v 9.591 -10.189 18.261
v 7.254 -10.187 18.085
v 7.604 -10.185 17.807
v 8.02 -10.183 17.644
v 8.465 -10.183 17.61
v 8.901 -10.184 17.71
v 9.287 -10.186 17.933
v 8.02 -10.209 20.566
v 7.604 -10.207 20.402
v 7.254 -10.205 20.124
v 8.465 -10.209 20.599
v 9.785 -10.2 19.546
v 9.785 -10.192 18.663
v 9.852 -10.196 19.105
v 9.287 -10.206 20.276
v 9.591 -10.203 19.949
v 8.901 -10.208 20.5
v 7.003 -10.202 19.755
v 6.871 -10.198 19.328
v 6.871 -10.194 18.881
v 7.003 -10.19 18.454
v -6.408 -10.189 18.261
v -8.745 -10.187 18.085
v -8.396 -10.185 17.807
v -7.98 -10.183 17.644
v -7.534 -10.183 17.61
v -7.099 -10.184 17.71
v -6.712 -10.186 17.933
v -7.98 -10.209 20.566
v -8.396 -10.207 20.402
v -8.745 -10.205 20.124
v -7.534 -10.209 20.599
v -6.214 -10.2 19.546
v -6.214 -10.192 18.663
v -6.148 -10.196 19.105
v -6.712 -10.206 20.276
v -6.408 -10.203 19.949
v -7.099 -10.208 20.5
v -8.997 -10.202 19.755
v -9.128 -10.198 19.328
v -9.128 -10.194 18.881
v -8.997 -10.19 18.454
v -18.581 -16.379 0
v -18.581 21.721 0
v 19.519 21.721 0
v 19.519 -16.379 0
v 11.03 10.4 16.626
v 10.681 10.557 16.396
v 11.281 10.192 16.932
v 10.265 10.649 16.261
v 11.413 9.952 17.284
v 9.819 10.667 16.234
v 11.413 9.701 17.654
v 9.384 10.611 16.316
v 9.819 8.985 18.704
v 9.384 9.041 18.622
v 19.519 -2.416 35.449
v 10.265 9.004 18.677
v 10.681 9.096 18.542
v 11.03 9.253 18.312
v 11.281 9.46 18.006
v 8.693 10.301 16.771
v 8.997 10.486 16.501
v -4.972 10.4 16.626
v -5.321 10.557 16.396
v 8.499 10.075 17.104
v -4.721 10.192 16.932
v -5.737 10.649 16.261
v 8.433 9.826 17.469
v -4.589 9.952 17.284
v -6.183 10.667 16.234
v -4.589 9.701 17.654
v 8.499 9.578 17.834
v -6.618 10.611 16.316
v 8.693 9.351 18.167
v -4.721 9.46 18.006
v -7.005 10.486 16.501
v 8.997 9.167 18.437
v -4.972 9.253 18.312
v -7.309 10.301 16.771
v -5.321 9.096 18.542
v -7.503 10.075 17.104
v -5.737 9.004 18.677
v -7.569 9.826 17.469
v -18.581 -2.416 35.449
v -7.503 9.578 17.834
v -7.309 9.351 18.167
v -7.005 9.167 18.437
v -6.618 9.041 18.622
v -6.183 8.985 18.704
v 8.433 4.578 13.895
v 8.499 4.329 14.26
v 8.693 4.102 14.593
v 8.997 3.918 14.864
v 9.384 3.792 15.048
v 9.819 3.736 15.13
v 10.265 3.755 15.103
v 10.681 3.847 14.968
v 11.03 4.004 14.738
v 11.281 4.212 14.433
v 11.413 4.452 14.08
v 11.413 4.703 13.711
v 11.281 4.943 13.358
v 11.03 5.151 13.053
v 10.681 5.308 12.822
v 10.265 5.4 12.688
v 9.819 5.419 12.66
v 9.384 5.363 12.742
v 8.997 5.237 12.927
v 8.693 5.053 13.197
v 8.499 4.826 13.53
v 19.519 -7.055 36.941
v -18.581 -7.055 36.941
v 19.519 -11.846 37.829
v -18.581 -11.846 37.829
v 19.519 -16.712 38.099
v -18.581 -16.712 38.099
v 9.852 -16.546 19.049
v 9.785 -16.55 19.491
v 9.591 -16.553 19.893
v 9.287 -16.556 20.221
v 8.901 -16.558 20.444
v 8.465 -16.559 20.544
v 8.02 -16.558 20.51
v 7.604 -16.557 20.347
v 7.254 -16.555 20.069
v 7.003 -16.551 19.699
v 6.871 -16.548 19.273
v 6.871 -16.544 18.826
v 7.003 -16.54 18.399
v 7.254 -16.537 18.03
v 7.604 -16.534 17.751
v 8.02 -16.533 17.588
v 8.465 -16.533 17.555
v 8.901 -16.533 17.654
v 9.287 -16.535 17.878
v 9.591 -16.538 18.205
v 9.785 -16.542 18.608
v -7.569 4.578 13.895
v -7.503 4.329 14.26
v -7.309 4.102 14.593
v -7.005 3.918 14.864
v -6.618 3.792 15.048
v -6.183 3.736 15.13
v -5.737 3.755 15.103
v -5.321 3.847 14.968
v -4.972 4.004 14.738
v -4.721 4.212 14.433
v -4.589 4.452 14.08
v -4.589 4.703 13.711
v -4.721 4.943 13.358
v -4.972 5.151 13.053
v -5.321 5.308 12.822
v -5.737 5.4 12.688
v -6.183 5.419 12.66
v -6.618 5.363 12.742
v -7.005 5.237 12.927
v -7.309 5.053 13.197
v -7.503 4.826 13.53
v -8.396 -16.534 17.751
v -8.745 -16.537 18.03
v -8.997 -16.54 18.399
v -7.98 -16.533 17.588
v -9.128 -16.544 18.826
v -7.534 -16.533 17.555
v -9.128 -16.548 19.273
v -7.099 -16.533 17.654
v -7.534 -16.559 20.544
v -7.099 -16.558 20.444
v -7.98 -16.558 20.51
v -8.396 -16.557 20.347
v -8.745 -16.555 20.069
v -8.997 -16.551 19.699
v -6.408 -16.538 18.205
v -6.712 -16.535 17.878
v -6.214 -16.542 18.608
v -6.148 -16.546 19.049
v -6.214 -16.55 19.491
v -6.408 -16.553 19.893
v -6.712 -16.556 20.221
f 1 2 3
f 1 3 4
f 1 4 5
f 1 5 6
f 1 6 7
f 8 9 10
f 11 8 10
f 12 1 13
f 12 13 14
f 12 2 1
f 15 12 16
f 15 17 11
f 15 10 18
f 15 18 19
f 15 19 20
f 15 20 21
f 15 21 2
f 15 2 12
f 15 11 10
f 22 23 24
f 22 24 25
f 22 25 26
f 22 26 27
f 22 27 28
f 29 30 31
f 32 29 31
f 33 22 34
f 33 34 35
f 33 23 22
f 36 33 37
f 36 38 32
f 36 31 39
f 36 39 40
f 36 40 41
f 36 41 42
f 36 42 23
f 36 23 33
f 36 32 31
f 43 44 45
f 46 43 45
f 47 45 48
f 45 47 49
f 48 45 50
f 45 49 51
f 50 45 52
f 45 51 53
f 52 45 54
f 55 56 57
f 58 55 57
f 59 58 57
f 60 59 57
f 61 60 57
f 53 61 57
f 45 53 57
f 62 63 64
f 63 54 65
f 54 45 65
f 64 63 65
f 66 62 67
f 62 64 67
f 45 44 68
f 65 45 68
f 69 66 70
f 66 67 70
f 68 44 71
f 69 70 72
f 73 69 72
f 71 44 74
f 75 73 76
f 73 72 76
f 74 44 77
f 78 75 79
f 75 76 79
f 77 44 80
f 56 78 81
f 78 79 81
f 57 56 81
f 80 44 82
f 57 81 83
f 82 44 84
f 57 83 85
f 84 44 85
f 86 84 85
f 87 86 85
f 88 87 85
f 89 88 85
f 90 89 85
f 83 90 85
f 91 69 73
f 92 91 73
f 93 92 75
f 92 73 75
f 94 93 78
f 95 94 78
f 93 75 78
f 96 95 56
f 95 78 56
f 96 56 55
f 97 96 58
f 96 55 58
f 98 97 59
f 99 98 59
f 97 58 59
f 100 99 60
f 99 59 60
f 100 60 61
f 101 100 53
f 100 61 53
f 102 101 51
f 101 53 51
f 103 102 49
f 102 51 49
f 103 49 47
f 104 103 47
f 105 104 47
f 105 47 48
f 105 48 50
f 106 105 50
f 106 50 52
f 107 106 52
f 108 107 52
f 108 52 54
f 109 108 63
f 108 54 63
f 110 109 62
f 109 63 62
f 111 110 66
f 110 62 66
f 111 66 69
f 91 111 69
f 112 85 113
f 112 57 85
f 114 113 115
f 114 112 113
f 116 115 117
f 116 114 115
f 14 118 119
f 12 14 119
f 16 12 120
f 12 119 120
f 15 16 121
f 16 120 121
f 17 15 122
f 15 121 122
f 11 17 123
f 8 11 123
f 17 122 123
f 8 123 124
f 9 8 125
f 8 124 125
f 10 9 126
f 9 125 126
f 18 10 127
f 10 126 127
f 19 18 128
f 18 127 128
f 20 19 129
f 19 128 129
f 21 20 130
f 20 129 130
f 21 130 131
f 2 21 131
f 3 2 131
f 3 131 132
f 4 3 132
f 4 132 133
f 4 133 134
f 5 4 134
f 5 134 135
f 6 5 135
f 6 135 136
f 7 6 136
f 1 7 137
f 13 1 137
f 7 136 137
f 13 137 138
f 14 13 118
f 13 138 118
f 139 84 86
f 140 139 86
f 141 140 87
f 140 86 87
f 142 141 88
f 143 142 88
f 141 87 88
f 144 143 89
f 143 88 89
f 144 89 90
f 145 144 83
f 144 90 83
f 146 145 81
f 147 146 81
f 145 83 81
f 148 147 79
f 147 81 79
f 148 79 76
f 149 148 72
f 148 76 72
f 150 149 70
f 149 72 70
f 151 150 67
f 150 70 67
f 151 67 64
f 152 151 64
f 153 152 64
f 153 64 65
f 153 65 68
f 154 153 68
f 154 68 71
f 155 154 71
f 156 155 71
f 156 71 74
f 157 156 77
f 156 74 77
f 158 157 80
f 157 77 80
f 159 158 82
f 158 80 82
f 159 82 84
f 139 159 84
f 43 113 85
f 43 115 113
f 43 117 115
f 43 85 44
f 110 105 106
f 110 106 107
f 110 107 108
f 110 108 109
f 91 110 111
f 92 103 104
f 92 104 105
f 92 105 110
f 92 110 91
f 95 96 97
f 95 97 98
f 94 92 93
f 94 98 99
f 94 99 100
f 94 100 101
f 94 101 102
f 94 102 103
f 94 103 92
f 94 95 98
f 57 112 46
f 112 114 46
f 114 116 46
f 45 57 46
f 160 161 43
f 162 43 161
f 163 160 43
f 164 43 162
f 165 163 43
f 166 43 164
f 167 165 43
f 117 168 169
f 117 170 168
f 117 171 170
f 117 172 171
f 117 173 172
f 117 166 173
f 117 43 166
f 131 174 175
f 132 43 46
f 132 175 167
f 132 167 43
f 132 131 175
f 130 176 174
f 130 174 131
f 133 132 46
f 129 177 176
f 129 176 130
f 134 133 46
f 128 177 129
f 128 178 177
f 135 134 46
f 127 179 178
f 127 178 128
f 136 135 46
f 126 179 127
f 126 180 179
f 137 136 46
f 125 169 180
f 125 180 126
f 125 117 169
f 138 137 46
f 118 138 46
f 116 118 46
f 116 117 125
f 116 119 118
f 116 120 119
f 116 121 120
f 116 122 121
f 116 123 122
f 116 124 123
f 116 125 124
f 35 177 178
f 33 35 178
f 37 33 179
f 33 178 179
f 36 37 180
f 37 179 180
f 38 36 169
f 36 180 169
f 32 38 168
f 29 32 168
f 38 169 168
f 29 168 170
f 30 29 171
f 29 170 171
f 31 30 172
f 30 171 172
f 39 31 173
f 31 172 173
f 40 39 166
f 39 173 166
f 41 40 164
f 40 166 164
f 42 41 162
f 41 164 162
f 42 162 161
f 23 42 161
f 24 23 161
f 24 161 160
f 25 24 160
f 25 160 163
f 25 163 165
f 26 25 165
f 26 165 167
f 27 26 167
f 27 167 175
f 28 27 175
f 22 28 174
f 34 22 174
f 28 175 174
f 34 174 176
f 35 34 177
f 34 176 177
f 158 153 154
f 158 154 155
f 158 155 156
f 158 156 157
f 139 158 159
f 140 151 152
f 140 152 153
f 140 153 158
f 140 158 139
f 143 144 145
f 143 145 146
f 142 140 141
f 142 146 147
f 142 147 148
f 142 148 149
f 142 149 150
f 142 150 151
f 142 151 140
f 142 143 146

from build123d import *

# Parameters (mm, degrees)
F0_W       = 38.1
F0_H       = 38.1
F1_ANGLE   = 68.5
F3_DEPTH   = 38.101
F1_FACE1_W = 38.1
F1_FACE1_H = 38.1
F4_ANGLE   = 22
F5_R       = 1.4986
F6_R       = 1.4986
F7_DEPTH   = 6.35
F8_R       = 1.4986
F9_DEPTH   = 6.35


with BuildPart() as f1:
    # F0 (on Top) → F1 (revolve)
    with BuildSketch(Plane.XY):
        with Locations((0.4687455922, 2.6705784231)):
            Rectangle(F0_W, F0_H)
    revolve(axis=Axis((0.4687455922, -16.3794215769, 0), (1, 0, 0)), revolution_arc=F1_ANGLE)

    # F2 (on face) → F3 (cut, through all)
    with BuildSketch(Plane(origin=(-18.5812544078, 0, 0), x_dir=(0, -1, 0), z_dir=(-1, 0, 0))):
        with BuildLine():
            Line((-21.7205784231, 0), (2.4157248387, 35.4489093401))
            ThreePointArc((2.4157248387, 35.4489093401), (-15.1136478649, 21.4428677452), (-21.7205784231, 0))
        make_face()
    extrude(amount=-F3_DEPTH, mode=Mode.SUBTRACT)

    # F1_face1 (on face) → F4 (revolve)
    with BuildSketch(Plane(origin=(0.4687455922, -9.3975732078, 17.7244546701), x_dir=(1, 0, 0), z_dir=(0, -0.930417568, 0.3665012267))):
        Rectangle(F1_FACE1_W, F1_FACE1_H)
    revolve(axis=Axis((0.4687455922, -16.3794215769, 0), (1, 0, 0)), revolution_arc=F4_ANGLE)

    # F5 (on face) + F6 (on face) → F7 (cut)
    with BuildSketch(Plane(origin=(0, -16.3781742442, -0.1429301613), x_dir=(1, 0, 0), z_dir=(0, -0.9999619231, -0.0087265355))):
        with Locations((-7.6464321464, 19.1929356038)):
            Circle(F5_R)
    with BuildSketch(Plane(origin=(0, -16.3781742442, -0.1429301613), x_dir=(1, 0, 0), z_dir=(0, -0.9999619231, -0.0087265355))):
        with Locations((8.3530278536, 19.1929356038)):
            Circle(F6_R)
    extrude(amount=-F7_DEPTH, mode=Mode.SUBTRACT)

    # F8 (on face) → F9 (cut)
    with BuildSketch(Plane(origin=(0, 14.8405985302, 10.1046038758), x_dir=(-1, 0, 0), z_dir=(0, 0.8265897491, 0.5628049277))):
        with Locations((-9.9312769204, 8.9093865827)):
            Circle(F8_R)
        with Locations((6.0707230796, 8.9093865827)):
            Circle(F8_R)
    extrude(amount=-F9_DEPTH, mode=Mode.SUBTRACT)


solid = f1.part
